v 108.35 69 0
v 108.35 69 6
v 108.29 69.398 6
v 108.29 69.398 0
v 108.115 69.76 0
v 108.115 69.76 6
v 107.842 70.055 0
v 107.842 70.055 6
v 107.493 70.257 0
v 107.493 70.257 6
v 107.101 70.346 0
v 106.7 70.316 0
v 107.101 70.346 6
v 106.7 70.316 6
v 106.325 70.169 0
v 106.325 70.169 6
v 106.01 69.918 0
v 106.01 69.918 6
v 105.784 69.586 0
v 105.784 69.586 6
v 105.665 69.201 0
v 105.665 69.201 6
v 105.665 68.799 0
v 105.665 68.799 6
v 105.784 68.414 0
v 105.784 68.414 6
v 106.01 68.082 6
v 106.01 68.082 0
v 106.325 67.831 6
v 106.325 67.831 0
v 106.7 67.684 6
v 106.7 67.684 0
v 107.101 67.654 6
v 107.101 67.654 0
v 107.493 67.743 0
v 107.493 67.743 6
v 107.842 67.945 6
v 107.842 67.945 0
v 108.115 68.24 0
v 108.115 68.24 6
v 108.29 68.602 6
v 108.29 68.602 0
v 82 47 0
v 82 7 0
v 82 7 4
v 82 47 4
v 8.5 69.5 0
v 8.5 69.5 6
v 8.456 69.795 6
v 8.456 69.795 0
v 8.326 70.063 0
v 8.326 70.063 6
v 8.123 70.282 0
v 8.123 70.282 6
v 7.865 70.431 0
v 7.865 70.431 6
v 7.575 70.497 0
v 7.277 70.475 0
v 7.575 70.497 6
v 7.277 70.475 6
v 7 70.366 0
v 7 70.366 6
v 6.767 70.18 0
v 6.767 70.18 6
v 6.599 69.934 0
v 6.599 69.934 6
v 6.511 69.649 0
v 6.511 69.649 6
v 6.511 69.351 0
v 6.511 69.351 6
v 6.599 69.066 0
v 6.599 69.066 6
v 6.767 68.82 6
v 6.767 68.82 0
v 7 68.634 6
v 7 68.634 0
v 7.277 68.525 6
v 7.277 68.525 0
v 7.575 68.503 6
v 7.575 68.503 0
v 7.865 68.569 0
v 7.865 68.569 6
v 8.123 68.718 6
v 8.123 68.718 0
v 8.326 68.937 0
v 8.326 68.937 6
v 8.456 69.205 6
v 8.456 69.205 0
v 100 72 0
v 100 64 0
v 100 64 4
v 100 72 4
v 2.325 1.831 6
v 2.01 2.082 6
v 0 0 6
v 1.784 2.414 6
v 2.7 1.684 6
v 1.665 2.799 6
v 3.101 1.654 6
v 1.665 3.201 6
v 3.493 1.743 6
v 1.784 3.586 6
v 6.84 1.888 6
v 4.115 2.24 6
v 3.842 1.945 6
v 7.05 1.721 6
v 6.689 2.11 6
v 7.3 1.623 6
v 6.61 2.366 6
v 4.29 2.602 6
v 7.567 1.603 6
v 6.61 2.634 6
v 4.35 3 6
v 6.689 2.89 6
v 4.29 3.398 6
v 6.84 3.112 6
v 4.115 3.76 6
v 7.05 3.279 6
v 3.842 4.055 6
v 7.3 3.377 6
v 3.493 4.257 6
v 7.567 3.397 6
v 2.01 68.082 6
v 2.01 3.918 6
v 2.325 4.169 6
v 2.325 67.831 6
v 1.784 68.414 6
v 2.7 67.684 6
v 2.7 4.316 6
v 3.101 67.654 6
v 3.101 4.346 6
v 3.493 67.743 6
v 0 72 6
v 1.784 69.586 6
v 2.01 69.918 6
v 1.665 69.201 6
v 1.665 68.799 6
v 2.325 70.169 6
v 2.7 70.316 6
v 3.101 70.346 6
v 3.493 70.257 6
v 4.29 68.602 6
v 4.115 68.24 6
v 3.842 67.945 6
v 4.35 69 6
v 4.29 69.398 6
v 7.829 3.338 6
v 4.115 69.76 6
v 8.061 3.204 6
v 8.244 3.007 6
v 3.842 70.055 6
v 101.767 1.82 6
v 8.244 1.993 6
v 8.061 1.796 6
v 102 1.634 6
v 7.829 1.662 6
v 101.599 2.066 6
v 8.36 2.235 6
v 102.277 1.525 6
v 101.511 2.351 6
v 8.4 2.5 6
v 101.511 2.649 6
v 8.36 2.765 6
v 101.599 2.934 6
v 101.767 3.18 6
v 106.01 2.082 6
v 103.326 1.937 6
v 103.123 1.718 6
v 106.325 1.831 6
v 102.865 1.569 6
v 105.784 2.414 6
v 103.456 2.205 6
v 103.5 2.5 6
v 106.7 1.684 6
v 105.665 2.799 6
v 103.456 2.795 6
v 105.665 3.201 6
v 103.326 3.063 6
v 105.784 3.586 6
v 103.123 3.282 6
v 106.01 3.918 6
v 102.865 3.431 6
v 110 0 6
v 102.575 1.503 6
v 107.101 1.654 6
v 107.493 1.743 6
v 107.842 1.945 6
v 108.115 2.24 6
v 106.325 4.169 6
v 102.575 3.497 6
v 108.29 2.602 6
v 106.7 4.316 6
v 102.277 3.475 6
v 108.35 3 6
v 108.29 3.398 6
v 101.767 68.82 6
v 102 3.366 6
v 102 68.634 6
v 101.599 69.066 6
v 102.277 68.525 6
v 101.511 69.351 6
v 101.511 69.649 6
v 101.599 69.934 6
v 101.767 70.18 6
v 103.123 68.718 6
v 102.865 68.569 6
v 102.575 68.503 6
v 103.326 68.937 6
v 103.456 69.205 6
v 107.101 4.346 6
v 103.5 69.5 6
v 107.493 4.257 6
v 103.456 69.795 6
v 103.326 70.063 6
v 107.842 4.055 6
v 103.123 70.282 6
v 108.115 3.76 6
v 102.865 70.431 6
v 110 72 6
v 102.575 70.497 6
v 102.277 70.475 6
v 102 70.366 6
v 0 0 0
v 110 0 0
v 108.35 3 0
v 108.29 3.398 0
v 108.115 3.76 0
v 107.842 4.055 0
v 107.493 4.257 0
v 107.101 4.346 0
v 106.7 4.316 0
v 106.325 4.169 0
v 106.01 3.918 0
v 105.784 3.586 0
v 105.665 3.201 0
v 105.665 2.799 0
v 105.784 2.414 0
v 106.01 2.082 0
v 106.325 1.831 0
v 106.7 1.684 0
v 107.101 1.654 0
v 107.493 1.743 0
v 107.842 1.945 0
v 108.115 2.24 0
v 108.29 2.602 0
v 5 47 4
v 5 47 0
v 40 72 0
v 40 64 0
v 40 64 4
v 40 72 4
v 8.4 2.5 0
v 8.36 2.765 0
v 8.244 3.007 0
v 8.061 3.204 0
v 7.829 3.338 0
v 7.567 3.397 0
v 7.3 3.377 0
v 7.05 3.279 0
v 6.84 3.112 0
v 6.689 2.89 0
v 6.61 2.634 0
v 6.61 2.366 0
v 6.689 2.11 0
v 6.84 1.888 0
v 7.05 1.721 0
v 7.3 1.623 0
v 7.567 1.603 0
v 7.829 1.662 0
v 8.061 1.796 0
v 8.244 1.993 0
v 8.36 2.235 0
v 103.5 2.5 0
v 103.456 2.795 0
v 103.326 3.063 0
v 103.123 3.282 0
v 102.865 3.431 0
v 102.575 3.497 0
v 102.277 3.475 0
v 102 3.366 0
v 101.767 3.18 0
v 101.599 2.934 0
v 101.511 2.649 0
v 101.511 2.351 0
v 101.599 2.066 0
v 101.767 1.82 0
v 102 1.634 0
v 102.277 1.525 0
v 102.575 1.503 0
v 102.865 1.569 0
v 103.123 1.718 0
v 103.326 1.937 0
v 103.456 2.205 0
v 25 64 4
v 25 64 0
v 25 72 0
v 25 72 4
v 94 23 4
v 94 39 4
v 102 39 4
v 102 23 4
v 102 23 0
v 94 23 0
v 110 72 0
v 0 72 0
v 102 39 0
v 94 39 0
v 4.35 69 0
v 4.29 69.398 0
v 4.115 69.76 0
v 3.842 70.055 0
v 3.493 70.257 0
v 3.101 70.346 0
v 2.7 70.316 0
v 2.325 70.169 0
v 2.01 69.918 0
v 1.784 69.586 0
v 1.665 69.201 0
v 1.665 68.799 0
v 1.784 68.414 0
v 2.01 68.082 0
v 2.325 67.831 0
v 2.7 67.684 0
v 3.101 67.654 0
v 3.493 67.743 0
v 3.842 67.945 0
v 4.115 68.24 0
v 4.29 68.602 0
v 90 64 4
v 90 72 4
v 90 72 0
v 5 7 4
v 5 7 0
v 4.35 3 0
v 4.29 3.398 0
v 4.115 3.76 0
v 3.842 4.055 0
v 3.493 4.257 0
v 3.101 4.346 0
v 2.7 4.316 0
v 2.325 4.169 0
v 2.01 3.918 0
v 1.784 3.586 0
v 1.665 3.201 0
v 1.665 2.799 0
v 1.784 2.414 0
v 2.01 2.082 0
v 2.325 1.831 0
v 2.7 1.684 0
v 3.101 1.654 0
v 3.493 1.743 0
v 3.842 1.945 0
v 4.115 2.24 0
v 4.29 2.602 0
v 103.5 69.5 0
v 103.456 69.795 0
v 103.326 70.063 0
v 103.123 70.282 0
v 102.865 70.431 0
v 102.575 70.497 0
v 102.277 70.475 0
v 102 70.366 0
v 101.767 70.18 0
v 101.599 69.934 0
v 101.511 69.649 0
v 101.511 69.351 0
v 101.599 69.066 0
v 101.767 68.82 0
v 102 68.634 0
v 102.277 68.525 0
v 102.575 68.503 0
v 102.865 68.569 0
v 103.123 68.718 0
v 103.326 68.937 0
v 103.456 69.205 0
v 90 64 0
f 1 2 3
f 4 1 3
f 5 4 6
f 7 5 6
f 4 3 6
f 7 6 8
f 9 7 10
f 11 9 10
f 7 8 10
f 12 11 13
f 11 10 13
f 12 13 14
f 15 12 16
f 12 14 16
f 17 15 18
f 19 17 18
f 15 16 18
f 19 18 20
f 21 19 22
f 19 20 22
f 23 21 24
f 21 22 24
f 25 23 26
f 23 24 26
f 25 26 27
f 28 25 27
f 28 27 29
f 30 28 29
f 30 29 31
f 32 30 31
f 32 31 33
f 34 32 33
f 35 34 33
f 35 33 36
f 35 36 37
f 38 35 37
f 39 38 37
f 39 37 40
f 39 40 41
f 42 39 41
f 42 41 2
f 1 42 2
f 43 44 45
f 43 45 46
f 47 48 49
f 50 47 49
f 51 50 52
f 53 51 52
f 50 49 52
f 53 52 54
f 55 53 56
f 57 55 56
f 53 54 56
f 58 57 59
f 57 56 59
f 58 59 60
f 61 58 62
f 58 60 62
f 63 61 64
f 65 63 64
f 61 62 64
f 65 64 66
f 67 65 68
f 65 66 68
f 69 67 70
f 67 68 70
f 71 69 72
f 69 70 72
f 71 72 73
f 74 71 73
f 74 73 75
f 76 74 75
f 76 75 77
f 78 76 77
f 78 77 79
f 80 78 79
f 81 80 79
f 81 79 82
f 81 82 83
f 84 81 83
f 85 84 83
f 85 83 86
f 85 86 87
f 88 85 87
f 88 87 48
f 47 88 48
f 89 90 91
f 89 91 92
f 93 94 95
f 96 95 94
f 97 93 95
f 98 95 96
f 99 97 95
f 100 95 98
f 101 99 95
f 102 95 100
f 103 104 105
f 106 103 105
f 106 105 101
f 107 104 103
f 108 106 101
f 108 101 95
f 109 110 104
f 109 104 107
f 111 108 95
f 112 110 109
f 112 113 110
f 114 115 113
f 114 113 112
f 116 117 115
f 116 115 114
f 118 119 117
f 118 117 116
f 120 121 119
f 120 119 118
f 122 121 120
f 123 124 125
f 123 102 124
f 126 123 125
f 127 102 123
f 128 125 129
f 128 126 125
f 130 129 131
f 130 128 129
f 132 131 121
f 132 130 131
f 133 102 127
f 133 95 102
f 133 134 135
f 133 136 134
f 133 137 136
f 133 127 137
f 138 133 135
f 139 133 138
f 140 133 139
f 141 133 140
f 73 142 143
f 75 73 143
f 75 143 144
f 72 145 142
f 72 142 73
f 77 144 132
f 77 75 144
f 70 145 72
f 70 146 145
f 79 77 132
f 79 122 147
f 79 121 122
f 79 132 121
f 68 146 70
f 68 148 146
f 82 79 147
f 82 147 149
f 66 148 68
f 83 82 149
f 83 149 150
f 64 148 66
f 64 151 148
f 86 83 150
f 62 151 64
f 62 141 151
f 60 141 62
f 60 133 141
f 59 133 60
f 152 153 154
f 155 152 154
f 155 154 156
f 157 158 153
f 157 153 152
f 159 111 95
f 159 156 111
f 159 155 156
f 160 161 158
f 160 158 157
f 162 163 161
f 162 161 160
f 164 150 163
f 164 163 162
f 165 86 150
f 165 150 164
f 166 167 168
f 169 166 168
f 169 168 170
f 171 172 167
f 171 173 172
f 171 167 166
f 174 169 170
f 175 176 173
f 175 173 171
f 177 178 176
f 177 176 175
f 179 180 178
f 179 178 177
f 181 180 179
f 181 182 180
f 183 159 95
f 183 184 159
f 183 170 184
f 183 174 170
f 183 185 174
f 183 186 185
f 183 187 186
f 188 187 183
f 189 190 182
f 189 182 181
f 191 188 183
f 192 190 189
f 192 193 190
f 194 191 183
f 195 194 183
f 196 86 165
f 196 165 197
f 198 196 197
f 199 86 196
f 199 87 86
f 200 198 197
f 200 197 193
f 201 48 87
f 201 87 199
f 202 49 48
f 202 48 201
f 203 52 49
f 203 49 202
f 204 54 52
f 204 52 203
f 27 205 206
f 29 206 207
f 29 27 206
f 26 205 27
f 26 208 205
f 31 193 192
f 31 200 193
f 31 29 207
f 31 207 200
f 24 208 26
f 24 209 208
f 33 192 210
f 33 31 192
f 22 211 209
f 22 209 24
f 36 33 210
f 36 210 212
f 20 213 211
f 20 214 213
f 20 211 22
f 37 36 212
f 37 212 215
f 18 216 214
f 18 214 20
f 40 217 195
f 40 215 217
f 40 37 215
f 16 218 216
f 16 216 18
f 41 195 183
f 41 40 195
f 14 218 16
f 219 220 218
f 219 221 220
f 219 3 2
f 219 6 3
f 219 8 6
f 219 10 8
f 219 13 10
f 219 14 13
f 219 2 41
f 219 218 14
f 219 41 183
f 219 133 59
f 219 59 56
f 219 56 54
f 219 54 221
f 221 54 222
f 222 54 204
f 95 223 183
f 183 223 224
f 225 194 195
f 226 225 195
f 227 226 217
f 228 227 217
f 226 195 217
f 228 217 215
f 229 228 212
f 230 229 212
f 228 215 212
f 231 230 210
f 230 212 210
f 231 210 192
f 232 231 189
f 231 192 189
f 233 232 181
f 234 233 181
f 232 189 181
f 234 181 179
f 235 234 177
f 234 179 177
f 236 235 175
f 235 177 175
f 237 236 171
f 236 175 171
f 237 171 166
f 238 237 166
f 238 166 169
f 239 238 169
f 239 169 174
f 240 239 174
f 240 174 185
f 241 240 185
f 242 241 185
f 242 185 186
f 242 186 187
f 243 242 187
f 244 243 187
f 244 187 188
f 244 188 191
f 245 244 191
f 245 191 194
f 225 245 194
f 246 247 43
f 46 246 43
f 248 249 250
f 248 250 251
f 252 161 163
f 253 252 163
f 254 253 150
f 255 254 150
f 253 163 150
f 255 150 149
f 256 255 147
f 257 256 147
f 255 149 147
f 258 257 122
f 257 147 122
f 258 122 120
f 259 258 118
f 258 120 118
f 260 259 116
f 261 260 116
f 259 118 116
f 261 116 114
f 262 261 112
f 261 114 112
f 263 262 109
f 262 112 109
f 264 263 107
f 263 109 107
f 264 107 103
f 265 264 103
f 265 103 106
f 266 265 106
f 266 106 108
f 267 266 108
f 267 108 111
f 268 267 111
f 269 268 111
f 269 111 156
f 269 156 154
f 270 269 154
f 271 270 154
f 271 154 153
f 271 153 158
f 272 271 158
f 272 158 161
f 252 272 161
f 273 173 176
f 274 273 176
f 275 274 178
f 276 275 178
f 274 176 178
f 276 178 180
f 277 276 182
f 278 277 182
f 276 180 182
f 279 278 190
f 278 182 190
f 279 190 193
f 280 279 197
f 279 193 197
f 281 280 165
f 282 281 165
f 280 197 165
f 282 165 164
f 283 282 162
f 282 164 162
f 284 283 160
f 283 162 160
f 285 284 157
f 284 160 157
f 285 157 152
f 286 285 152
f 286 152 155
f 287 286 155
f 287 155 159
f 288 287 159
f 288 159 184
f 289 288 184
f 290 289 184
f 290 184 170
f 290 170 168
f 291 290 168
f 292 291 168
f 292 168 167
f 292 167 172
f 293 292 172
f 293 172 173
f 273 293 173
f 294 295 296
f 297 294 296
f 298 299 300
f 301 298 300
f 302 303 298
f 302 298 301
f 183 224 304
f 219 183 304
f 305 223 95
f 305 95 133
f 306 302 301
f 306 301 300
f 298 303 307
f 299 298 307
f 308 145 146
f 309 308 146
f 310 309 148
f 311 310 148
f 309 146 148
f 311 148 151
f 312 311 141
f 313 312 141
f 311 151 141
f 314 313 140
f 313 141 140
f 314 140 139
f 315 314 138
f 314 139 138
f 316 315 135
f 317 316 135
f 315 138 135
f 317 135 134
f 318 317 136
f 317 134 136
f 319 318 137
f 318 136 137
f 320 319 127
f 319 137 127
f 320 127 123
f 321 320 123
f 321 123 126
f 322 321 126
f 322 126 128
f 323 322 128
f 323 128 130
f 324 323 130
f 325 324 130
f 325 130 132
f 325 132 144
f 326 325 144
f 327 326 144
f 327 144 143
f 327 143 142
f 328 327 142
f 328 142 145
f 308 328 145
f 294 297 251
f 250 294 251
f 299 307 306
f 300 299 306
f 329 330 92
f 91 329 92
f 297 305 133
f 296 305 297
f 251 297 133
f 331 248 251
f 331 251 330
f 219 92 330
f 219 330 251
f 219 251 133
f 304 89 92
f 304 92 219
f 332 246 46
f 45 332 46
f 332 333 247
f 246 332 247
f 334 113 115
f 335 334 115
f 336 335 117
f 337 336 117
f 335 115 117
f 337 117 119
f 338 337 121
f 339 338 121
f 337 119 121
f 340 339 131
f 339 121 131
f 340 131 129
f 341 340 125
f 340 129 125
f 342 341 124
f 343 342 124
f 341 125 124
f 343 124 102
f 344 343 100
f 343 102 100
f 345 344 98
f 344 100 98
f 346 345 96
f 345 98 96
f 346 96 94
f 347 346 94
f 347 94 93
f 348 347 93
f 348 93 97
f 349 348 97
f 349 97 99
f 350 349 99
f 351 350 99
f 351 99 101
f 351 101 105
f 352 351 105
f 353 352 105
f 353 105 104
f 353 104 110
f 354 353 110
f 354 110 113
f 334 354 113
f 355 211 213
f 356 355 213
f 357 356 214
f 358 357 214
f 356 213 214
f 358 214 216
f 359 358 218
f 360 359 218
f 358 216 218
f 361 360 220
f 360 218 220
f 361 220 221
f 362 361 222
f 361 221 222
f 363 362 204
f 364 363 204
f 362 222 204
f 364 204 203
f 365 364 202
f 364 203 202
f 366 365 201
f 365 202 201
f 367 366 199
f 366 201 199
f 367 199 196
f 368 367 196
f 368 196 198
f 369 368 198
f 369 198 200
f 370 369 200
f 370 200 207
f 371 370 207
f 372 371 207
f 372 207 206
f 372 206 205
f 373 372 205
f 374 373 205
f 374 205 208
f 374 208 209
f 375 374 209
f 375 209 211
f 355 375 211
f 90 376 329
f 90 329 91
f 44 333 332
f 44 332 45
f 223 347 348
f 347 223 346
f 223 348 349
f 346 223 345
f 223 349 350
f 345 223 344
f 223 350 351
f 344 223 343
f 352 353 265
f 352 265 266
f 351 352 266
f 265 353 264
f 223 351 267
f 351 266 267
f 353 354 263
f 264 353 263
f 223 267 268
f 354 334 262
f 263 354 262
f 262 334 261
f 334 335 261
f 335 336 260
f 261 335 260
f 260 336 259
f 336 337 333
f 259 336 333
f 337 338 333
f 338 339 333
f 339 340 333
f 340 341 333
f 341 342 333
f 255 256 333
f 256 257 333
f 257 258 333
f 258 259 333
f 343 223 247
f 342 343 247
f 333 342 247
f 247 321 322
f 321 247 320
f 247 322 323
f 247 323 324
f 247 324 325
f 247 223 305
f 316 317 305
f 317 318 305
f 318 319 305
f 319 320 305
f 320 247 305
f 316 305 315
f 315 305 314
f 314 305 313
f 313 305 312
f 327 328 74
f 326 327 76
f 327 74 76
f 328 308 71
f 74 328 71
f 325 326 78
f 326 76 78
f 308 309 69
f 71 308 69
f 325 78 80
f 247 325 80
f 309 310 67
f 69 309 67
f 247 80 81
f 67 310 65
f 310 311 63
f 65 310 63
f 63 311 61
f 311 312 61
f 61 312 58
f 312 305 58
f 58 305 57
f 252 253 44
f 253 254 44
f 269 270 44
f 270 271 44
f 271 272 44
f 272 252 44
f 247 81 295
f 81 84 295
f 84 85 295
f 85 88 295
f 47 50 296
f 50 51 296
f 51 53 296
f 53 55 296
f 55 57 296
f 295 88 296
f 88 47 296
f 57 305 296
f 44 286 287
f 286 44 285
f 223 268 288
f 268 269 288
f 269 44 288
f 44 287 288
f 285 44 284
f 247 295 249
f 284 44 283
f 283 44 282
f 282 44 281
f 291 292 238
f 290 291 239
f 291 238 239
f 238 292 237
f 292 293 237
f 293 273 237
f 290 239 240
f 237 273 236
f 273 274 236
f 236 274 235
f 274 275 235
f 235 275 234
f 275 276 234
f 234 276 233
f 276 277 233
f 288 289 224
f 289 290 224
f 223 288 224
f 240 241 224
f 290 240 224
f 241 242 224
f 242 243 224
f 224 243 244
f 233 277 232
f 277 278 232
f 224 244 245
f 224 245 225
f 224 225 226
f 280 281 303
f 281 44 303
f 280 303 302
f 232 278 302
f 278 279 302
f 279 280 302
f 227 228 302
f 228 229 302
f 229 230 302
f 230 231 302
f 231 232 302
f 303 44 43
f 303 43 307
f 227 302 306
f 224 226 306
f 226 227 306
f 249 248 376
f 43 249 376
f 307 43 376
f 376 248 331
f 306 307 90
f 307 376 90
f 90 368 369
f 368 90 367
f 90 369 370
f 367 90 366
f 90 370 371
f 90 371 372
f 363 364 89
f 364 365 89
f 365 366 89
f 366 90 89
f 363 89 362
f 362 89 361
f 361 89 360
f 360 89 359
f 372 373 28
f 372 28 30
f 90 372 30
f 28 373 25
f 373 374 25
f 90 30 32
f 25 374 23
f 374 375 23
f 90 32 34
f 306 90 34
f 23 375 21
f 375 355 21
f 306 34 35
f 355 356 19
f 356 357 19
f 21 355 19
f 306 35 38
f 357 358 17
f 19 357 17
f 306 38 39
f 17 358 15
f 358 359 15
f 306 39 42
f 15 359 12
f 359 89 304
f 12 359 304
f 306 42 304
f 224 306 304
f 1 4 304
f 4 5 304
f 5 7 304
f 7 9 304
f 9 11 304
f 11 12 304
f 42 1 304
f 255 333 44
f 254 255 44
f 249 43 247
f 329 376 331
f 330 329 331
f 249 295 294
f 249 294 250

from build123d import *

# Parameters (mm, degrees)
MAIN_SKETCH_W        = 110
MAIN_SKETCH_H        = 72
MAIN_EXTRUSION_DEPTH = 6
MAIN_HOLE_SKETCH_R   = 1
MAIN_HOLE_SKETCH_R_2 = 0.9
MAIN_HOLE_DEPTH      = 7
EPIA_FIX_SKETCH_W    = 77
EPIA_FIX_SKETCH_H    = 40
EPIA_FIX_SKETCH_W_2  = 15
EPIA_FIX_SKETCH_H_2  = 8
EPIA_FIX_SKETCH_W_3  = 10
EPIA_FIX_SKETCH_W_4  = 8
EPIA_FIX_SKETCH_H_3  = 16
EPIA_FIX_DEPTH       = 4
FIX_SKETCH_R         = 1.35
FIX_HOLE_DEPTH       = 7


with BuildPart() as part:
    # Main-Sketch → Main-Extrusion (new body)
    with BuildSketch(Plane.XY):
        with Locations((55, 36)):
            Rectangle(MAIN_SKETCH_W, MAIN_SKETCH_H)
    extrude(amount=MAIN_EXTRUSION_DEPTH)

    # Main-Hole-Sketch → Main-Hole (cut, through all)
    with BuildSketch(Plane.XY.offset(6)):
        with Locations((7.5, 69.5)):
            Circle(MAIN_HOLE_SKETCH_R)
        with Locations((7.5, 2.5)):
            Circle(MAIN_HOLE_SKETCH_R_2)
        with Locations((102.5, 2.5)):
            Circle(MAIN_HOLE_SKETCH_R)
        with Locations((102.5, 69.5)):
            Circle(MAIN_HOLE_SKETCH_R)
    extrude(amount=-MAIN_HOLE_DEPTH, mode=Mode.SUBTRACT)

    # Epia-Fix-Sketch → Epia-Fix (cut)
    with BuildSketch(Plane.XY):
        with Locations((43.5, 27)):
            Rectangle(EPIA_FIX_SKETCH_W, EPIA_FIX_SKETCH_H)
        with Locations((32.5, 68)):
            Rectangle(EPIA_FIX_SKETCH_W_2, EPIA_FIX_SKETCH_H_2)
        with Locations((95, 68)):
            Rectangle(EPIA_FIX_SKETCH_W_3, EPIA_FIX_SKETCH_H_2)
        with Locations((98, 31)):
            Rectangle(EPIA_FIX_SKETCH_W_4, EPIA_FIX_SKETCH_H_3)
    extrude(amount=EPIA_FIX_DEPTH, mode=Mode.SUBTRACT)

    # Fix-Sketch → Fix-Hole (cut, through all)
    with BuildSketch(Plane.XY.offset(6)):
        with Locations((107, 69)):
            Circle(FIX_SKETCH_R)
        with Locations((107, 3)):
            Circle(FIX_SKETCH_R)
        with Locations((3, 69)):
            Circle(FIX_SKETCH_R)
        with Locations((3, 3)):
            Circle(FIX_SKETCH_R)
    extrude(amount=-FIX_HOLE_DEPTH, mode=Mode.SUBTRACT)


solid = part.part
